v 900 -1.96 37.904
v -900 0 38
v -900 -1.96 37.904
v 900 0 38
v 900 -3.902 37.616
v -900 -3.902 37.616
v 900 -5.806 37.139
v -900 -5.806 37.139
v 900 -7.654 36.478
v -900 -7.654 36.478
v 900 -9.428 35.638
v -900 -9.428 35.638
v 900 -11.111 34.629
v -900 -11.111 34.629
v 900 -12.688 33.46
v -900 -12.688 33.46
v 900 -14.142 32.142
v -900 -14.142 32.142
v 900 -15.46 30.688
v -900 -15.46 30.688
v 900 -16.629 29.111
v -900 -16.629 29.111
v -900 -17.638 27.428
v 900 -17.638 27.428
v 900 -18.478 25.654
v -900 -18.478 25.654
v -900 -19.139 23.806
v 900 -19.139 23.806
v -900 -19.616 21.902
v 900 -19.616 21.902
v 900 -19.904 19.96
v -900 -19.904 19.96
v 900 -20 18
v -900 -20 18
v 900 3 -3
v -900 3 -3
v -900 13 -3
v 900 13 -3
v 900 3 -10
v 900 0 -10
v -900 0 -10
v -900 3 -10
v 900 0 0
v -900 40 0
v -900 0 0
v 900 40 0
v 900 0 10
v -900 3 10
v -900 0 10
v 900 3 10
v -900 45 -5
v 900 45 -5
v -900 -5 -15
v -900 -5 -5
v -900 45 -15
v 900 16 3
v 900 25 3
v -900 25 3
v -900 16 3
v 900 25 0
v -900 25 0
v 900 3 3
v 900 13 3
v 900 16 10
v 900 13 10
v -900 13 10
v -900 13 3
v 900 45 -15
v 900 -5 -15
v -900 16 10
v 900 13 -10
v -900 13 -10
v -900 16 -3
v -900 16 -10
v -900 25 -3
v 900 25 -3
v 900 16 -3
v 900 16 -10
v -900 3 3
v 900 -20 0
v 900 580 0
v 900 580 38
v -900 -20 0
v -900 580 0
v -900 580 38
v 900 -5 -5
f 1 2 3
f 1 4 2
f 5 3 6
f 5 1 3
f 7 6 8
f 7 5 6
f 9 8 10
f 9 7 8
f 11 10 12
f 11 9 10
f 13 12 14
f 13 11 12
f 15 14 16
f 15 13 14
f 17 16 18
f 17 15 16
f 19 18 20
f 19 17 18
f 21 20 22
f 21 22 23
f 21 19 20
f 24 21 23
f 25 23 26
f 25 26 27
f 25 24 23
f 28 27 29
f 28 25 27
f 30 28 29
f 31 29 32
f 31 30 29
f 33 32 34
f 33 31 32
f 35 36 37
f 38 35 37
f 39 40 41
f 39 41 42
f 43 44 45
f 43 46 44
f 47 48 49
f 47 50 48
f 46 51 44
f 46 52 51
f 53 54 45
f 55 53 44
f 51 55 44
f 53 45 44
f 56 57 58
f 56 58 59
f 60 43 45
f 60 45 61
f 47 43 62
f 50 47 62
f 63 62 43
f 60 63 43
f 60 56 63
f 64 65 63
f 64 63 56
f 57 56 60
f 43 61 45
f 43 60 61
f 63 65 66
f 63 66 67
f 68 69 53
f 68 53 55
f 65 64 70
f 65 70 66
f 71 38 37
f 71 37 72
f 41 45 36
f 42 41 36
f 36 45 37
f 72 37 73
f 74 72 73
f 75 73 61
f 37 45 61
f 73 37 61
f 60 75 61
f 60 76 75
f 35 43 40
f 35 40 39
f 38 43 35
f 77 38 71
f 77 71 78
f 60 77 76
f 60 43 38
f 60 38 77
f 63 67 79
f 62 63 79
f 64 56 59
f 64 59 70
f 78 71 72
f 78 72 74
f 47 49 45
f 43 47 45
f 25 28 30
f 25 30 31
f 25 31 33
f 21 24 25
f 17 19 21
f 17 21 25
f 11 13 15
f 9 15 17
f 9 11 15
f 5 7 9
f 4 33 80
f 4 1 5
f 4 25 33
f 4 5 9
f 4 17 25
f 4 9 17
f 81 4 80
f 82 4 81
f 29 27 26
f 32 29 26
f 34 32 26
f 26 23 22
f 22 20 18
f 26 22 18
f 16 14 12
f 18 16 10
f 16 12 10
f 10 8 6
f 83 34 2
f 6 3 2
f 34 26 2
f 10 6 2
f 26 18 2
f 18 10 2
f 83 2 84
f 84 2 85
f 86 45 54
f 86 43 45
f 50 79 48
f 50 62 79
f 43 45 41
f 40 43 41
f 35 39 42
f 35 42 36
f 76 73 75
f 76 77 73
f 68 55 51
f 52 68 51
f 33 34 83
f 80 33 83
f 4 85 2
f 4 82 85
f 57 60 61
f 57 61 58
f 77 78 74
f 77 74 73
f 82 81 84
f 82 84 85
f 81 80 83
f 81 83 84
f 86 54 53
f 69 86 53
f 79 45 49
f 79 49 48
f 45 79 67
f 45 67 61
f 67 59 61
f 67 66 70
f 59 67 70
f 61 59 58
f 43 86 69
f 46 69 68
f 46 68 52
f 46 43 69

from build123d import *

# Parameters (mm, degrees)
F1_DEPTH = 900
F3_DEPTH = 900
F5_DEPTH = 900
F7_DEPTH = 900


with BuildPart() as f1:
    # F0 (on Right) → F1 (new body, symmetric)
    with BuildSketch(Plane.YZ):
        with BuildLine():
            Line((-20, 18), (-20, 0))
            Line((-20, 0), (580, 0))
            Line((580, 0), (580, 38))
            Line((580, 38), (0, 38))
            ThreePointArc((0, 38), (-14.1421356237, 32.1421356237), (-20, 18))
        make_face()
    extrude(amount=F1_DEPTH, both=True)


with BuildPart() as f3:
    # F2 (on Right) → F3 (new body, symmetric)
    with BuildSketch(Plane.YZ):
        Polygon((0, 10), (0, 0), (25, 0), (25, 3), (16, 3), (16, 10), (13, 10), (13, 3), (3, 3), (3, 10), align=None)
    extrude(amount=F3_DEPTH, both=True)


with BuildPart() as f5:
    # F4 (on Right) → F5 (new body, symmetric)
    with BuildSketch(Plane.YZ):
        Polygon((25, 0), (0, 0), (-5, -5), (-5, -15), (45, -15), (45, -5), (40, 0), align=None)
    extrude(amount=F5_DEPTH, both=True)


with BuildPart() as f7:
    # F6 (on Right) → F7 (new body, symmetric)
    with BuildSketch(Plane.YZ):
        Polygon((25, 0), (0, 0), (0, -10), (3, -10), (3, -3), (13, -3), (13, -10), (16, -10), (16, -3), (25, -3), align=None)
    extrude(amount=F7_DEPTH, both=True)


solid = Compound([f1.part, f3.part, f5.part, f7.part])
